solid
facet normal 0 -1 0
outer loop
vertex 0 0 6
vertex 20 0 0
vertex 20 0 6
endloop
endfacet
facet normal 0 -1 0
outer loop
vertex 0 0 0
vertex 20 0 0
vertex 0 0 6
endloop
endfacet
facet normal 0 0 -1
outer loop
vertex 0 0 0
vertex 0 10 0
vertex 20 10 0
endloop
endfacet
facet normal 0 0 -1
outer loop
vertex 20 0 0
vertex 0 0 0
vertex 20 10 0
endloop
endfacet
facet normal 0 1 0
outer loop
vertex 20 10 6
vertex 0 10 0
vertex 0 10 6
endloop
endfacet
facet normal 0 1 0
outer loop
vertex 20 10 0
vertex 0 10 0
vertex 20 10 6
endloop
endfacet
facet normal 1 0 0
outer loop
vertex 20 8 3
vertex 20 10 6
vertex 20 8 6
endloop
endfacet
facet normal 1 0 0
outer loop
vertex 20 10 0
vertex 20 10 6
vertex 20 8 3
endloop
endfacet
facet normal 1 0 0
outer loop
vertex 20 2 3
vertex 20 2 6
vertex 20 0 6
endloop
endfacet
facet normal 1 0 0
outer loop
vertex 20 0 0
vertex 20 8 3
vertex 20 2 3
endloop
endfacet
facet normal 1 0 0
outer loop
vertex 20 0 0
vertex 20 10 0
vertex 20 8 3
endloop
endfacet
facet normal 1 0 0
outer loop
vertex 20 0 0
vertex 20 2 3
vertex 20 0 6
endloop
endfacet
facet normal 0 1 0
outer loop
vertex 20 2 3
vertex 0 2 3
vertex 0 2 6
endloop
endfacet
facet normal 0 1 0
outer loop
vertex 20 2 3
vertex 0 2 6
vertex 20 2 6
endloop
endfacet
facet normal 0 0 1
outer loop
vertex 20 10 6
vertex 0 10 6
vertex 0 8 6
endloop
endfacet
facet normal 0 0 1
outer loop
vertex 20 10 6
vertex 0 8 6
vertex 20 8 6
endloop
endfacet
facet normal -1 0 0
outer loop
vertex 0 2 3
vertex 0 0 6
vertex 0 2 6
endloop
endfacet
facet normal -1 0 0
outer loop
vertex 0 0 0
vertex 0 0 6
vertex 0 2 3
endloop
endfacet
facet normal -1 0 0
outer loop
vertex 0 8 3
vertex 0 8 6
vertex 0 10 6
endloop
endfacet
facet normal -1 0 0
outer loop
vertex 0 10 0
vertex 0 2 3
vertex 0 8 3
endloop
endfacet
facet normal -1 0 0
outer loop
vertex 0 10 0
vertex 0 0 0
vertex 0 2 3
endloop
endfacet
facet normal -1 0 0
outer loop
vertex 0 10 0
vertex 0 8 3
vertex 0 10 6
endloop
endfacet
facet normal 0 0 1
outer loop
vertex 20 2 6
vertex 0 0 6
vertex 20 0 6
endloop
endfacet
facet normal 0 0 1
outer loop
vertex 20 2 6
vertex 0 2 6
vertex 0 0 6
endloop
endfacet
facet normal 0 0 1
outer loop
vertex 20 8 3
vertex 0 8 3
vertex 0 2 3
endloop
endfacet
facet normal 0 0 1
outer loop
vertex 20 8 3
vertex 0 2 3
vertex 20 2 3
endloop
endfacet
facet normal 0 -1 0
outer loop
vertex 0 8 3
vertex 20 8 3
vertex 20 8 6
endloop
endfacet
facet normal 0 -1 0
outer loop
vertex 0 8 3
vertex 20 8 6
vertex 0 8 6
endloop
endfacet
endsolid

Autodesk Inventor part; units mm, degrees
ref_plane "YZ Plane" through (0, 0, 0) normal (1, 0, 0) x (0, 1, 0)
ref_plane "XZ Plane" through (0, 0, 0) normal (0, 1, 0) x (-1, 0, 0)
ref_plane "XY Plane" through (0, 0, 0) normal (0, 0, 1) x (1, 0, 0)
sketch "草圖1" plane through (0, 0, 0) normal (0, 0, 1) x (1, 0, 0)
  line L0 (0, 10) -> (20, 10)
  line L1 (20, 10) -> (20, 0)
  line L2 (20, 0) -> (0, 0)
  line L3 (0, 0) -> (0, 10)
  dimension "d0" = 10
  dimension "d1" = 20
extrude "擠出1" add sketch "草圖1" along normal blind 3
sketch "草圖2" plane through (0, 0, 3) normal (0, 0, 1) x (1, 0, 0)
  line L0 (20, 10) -> (0, 10) projected
  line L1 (20, 0) -> (20, 10) projected
  line L2 (0, 10) -> (20, 10)
  line L3 (20, 10) -> (20, 8)
  line L4 (20, 8) -> (0, 8)
  line L5 (0, 8) -> (0, 10)
  line L6 (20, 0) -> (0, 0)
  line L7 (0, 0) -> (0, 2)
  line L8 (0, 2) -> (20, 2)
  line L9 (20, 2) -> (20, 0)
  point P0 (0, 0)
  dimension "d4" = 2
  dimension "d5" = 2
extrude "擠出2" add sketch "草圖2" along normal blind 3
